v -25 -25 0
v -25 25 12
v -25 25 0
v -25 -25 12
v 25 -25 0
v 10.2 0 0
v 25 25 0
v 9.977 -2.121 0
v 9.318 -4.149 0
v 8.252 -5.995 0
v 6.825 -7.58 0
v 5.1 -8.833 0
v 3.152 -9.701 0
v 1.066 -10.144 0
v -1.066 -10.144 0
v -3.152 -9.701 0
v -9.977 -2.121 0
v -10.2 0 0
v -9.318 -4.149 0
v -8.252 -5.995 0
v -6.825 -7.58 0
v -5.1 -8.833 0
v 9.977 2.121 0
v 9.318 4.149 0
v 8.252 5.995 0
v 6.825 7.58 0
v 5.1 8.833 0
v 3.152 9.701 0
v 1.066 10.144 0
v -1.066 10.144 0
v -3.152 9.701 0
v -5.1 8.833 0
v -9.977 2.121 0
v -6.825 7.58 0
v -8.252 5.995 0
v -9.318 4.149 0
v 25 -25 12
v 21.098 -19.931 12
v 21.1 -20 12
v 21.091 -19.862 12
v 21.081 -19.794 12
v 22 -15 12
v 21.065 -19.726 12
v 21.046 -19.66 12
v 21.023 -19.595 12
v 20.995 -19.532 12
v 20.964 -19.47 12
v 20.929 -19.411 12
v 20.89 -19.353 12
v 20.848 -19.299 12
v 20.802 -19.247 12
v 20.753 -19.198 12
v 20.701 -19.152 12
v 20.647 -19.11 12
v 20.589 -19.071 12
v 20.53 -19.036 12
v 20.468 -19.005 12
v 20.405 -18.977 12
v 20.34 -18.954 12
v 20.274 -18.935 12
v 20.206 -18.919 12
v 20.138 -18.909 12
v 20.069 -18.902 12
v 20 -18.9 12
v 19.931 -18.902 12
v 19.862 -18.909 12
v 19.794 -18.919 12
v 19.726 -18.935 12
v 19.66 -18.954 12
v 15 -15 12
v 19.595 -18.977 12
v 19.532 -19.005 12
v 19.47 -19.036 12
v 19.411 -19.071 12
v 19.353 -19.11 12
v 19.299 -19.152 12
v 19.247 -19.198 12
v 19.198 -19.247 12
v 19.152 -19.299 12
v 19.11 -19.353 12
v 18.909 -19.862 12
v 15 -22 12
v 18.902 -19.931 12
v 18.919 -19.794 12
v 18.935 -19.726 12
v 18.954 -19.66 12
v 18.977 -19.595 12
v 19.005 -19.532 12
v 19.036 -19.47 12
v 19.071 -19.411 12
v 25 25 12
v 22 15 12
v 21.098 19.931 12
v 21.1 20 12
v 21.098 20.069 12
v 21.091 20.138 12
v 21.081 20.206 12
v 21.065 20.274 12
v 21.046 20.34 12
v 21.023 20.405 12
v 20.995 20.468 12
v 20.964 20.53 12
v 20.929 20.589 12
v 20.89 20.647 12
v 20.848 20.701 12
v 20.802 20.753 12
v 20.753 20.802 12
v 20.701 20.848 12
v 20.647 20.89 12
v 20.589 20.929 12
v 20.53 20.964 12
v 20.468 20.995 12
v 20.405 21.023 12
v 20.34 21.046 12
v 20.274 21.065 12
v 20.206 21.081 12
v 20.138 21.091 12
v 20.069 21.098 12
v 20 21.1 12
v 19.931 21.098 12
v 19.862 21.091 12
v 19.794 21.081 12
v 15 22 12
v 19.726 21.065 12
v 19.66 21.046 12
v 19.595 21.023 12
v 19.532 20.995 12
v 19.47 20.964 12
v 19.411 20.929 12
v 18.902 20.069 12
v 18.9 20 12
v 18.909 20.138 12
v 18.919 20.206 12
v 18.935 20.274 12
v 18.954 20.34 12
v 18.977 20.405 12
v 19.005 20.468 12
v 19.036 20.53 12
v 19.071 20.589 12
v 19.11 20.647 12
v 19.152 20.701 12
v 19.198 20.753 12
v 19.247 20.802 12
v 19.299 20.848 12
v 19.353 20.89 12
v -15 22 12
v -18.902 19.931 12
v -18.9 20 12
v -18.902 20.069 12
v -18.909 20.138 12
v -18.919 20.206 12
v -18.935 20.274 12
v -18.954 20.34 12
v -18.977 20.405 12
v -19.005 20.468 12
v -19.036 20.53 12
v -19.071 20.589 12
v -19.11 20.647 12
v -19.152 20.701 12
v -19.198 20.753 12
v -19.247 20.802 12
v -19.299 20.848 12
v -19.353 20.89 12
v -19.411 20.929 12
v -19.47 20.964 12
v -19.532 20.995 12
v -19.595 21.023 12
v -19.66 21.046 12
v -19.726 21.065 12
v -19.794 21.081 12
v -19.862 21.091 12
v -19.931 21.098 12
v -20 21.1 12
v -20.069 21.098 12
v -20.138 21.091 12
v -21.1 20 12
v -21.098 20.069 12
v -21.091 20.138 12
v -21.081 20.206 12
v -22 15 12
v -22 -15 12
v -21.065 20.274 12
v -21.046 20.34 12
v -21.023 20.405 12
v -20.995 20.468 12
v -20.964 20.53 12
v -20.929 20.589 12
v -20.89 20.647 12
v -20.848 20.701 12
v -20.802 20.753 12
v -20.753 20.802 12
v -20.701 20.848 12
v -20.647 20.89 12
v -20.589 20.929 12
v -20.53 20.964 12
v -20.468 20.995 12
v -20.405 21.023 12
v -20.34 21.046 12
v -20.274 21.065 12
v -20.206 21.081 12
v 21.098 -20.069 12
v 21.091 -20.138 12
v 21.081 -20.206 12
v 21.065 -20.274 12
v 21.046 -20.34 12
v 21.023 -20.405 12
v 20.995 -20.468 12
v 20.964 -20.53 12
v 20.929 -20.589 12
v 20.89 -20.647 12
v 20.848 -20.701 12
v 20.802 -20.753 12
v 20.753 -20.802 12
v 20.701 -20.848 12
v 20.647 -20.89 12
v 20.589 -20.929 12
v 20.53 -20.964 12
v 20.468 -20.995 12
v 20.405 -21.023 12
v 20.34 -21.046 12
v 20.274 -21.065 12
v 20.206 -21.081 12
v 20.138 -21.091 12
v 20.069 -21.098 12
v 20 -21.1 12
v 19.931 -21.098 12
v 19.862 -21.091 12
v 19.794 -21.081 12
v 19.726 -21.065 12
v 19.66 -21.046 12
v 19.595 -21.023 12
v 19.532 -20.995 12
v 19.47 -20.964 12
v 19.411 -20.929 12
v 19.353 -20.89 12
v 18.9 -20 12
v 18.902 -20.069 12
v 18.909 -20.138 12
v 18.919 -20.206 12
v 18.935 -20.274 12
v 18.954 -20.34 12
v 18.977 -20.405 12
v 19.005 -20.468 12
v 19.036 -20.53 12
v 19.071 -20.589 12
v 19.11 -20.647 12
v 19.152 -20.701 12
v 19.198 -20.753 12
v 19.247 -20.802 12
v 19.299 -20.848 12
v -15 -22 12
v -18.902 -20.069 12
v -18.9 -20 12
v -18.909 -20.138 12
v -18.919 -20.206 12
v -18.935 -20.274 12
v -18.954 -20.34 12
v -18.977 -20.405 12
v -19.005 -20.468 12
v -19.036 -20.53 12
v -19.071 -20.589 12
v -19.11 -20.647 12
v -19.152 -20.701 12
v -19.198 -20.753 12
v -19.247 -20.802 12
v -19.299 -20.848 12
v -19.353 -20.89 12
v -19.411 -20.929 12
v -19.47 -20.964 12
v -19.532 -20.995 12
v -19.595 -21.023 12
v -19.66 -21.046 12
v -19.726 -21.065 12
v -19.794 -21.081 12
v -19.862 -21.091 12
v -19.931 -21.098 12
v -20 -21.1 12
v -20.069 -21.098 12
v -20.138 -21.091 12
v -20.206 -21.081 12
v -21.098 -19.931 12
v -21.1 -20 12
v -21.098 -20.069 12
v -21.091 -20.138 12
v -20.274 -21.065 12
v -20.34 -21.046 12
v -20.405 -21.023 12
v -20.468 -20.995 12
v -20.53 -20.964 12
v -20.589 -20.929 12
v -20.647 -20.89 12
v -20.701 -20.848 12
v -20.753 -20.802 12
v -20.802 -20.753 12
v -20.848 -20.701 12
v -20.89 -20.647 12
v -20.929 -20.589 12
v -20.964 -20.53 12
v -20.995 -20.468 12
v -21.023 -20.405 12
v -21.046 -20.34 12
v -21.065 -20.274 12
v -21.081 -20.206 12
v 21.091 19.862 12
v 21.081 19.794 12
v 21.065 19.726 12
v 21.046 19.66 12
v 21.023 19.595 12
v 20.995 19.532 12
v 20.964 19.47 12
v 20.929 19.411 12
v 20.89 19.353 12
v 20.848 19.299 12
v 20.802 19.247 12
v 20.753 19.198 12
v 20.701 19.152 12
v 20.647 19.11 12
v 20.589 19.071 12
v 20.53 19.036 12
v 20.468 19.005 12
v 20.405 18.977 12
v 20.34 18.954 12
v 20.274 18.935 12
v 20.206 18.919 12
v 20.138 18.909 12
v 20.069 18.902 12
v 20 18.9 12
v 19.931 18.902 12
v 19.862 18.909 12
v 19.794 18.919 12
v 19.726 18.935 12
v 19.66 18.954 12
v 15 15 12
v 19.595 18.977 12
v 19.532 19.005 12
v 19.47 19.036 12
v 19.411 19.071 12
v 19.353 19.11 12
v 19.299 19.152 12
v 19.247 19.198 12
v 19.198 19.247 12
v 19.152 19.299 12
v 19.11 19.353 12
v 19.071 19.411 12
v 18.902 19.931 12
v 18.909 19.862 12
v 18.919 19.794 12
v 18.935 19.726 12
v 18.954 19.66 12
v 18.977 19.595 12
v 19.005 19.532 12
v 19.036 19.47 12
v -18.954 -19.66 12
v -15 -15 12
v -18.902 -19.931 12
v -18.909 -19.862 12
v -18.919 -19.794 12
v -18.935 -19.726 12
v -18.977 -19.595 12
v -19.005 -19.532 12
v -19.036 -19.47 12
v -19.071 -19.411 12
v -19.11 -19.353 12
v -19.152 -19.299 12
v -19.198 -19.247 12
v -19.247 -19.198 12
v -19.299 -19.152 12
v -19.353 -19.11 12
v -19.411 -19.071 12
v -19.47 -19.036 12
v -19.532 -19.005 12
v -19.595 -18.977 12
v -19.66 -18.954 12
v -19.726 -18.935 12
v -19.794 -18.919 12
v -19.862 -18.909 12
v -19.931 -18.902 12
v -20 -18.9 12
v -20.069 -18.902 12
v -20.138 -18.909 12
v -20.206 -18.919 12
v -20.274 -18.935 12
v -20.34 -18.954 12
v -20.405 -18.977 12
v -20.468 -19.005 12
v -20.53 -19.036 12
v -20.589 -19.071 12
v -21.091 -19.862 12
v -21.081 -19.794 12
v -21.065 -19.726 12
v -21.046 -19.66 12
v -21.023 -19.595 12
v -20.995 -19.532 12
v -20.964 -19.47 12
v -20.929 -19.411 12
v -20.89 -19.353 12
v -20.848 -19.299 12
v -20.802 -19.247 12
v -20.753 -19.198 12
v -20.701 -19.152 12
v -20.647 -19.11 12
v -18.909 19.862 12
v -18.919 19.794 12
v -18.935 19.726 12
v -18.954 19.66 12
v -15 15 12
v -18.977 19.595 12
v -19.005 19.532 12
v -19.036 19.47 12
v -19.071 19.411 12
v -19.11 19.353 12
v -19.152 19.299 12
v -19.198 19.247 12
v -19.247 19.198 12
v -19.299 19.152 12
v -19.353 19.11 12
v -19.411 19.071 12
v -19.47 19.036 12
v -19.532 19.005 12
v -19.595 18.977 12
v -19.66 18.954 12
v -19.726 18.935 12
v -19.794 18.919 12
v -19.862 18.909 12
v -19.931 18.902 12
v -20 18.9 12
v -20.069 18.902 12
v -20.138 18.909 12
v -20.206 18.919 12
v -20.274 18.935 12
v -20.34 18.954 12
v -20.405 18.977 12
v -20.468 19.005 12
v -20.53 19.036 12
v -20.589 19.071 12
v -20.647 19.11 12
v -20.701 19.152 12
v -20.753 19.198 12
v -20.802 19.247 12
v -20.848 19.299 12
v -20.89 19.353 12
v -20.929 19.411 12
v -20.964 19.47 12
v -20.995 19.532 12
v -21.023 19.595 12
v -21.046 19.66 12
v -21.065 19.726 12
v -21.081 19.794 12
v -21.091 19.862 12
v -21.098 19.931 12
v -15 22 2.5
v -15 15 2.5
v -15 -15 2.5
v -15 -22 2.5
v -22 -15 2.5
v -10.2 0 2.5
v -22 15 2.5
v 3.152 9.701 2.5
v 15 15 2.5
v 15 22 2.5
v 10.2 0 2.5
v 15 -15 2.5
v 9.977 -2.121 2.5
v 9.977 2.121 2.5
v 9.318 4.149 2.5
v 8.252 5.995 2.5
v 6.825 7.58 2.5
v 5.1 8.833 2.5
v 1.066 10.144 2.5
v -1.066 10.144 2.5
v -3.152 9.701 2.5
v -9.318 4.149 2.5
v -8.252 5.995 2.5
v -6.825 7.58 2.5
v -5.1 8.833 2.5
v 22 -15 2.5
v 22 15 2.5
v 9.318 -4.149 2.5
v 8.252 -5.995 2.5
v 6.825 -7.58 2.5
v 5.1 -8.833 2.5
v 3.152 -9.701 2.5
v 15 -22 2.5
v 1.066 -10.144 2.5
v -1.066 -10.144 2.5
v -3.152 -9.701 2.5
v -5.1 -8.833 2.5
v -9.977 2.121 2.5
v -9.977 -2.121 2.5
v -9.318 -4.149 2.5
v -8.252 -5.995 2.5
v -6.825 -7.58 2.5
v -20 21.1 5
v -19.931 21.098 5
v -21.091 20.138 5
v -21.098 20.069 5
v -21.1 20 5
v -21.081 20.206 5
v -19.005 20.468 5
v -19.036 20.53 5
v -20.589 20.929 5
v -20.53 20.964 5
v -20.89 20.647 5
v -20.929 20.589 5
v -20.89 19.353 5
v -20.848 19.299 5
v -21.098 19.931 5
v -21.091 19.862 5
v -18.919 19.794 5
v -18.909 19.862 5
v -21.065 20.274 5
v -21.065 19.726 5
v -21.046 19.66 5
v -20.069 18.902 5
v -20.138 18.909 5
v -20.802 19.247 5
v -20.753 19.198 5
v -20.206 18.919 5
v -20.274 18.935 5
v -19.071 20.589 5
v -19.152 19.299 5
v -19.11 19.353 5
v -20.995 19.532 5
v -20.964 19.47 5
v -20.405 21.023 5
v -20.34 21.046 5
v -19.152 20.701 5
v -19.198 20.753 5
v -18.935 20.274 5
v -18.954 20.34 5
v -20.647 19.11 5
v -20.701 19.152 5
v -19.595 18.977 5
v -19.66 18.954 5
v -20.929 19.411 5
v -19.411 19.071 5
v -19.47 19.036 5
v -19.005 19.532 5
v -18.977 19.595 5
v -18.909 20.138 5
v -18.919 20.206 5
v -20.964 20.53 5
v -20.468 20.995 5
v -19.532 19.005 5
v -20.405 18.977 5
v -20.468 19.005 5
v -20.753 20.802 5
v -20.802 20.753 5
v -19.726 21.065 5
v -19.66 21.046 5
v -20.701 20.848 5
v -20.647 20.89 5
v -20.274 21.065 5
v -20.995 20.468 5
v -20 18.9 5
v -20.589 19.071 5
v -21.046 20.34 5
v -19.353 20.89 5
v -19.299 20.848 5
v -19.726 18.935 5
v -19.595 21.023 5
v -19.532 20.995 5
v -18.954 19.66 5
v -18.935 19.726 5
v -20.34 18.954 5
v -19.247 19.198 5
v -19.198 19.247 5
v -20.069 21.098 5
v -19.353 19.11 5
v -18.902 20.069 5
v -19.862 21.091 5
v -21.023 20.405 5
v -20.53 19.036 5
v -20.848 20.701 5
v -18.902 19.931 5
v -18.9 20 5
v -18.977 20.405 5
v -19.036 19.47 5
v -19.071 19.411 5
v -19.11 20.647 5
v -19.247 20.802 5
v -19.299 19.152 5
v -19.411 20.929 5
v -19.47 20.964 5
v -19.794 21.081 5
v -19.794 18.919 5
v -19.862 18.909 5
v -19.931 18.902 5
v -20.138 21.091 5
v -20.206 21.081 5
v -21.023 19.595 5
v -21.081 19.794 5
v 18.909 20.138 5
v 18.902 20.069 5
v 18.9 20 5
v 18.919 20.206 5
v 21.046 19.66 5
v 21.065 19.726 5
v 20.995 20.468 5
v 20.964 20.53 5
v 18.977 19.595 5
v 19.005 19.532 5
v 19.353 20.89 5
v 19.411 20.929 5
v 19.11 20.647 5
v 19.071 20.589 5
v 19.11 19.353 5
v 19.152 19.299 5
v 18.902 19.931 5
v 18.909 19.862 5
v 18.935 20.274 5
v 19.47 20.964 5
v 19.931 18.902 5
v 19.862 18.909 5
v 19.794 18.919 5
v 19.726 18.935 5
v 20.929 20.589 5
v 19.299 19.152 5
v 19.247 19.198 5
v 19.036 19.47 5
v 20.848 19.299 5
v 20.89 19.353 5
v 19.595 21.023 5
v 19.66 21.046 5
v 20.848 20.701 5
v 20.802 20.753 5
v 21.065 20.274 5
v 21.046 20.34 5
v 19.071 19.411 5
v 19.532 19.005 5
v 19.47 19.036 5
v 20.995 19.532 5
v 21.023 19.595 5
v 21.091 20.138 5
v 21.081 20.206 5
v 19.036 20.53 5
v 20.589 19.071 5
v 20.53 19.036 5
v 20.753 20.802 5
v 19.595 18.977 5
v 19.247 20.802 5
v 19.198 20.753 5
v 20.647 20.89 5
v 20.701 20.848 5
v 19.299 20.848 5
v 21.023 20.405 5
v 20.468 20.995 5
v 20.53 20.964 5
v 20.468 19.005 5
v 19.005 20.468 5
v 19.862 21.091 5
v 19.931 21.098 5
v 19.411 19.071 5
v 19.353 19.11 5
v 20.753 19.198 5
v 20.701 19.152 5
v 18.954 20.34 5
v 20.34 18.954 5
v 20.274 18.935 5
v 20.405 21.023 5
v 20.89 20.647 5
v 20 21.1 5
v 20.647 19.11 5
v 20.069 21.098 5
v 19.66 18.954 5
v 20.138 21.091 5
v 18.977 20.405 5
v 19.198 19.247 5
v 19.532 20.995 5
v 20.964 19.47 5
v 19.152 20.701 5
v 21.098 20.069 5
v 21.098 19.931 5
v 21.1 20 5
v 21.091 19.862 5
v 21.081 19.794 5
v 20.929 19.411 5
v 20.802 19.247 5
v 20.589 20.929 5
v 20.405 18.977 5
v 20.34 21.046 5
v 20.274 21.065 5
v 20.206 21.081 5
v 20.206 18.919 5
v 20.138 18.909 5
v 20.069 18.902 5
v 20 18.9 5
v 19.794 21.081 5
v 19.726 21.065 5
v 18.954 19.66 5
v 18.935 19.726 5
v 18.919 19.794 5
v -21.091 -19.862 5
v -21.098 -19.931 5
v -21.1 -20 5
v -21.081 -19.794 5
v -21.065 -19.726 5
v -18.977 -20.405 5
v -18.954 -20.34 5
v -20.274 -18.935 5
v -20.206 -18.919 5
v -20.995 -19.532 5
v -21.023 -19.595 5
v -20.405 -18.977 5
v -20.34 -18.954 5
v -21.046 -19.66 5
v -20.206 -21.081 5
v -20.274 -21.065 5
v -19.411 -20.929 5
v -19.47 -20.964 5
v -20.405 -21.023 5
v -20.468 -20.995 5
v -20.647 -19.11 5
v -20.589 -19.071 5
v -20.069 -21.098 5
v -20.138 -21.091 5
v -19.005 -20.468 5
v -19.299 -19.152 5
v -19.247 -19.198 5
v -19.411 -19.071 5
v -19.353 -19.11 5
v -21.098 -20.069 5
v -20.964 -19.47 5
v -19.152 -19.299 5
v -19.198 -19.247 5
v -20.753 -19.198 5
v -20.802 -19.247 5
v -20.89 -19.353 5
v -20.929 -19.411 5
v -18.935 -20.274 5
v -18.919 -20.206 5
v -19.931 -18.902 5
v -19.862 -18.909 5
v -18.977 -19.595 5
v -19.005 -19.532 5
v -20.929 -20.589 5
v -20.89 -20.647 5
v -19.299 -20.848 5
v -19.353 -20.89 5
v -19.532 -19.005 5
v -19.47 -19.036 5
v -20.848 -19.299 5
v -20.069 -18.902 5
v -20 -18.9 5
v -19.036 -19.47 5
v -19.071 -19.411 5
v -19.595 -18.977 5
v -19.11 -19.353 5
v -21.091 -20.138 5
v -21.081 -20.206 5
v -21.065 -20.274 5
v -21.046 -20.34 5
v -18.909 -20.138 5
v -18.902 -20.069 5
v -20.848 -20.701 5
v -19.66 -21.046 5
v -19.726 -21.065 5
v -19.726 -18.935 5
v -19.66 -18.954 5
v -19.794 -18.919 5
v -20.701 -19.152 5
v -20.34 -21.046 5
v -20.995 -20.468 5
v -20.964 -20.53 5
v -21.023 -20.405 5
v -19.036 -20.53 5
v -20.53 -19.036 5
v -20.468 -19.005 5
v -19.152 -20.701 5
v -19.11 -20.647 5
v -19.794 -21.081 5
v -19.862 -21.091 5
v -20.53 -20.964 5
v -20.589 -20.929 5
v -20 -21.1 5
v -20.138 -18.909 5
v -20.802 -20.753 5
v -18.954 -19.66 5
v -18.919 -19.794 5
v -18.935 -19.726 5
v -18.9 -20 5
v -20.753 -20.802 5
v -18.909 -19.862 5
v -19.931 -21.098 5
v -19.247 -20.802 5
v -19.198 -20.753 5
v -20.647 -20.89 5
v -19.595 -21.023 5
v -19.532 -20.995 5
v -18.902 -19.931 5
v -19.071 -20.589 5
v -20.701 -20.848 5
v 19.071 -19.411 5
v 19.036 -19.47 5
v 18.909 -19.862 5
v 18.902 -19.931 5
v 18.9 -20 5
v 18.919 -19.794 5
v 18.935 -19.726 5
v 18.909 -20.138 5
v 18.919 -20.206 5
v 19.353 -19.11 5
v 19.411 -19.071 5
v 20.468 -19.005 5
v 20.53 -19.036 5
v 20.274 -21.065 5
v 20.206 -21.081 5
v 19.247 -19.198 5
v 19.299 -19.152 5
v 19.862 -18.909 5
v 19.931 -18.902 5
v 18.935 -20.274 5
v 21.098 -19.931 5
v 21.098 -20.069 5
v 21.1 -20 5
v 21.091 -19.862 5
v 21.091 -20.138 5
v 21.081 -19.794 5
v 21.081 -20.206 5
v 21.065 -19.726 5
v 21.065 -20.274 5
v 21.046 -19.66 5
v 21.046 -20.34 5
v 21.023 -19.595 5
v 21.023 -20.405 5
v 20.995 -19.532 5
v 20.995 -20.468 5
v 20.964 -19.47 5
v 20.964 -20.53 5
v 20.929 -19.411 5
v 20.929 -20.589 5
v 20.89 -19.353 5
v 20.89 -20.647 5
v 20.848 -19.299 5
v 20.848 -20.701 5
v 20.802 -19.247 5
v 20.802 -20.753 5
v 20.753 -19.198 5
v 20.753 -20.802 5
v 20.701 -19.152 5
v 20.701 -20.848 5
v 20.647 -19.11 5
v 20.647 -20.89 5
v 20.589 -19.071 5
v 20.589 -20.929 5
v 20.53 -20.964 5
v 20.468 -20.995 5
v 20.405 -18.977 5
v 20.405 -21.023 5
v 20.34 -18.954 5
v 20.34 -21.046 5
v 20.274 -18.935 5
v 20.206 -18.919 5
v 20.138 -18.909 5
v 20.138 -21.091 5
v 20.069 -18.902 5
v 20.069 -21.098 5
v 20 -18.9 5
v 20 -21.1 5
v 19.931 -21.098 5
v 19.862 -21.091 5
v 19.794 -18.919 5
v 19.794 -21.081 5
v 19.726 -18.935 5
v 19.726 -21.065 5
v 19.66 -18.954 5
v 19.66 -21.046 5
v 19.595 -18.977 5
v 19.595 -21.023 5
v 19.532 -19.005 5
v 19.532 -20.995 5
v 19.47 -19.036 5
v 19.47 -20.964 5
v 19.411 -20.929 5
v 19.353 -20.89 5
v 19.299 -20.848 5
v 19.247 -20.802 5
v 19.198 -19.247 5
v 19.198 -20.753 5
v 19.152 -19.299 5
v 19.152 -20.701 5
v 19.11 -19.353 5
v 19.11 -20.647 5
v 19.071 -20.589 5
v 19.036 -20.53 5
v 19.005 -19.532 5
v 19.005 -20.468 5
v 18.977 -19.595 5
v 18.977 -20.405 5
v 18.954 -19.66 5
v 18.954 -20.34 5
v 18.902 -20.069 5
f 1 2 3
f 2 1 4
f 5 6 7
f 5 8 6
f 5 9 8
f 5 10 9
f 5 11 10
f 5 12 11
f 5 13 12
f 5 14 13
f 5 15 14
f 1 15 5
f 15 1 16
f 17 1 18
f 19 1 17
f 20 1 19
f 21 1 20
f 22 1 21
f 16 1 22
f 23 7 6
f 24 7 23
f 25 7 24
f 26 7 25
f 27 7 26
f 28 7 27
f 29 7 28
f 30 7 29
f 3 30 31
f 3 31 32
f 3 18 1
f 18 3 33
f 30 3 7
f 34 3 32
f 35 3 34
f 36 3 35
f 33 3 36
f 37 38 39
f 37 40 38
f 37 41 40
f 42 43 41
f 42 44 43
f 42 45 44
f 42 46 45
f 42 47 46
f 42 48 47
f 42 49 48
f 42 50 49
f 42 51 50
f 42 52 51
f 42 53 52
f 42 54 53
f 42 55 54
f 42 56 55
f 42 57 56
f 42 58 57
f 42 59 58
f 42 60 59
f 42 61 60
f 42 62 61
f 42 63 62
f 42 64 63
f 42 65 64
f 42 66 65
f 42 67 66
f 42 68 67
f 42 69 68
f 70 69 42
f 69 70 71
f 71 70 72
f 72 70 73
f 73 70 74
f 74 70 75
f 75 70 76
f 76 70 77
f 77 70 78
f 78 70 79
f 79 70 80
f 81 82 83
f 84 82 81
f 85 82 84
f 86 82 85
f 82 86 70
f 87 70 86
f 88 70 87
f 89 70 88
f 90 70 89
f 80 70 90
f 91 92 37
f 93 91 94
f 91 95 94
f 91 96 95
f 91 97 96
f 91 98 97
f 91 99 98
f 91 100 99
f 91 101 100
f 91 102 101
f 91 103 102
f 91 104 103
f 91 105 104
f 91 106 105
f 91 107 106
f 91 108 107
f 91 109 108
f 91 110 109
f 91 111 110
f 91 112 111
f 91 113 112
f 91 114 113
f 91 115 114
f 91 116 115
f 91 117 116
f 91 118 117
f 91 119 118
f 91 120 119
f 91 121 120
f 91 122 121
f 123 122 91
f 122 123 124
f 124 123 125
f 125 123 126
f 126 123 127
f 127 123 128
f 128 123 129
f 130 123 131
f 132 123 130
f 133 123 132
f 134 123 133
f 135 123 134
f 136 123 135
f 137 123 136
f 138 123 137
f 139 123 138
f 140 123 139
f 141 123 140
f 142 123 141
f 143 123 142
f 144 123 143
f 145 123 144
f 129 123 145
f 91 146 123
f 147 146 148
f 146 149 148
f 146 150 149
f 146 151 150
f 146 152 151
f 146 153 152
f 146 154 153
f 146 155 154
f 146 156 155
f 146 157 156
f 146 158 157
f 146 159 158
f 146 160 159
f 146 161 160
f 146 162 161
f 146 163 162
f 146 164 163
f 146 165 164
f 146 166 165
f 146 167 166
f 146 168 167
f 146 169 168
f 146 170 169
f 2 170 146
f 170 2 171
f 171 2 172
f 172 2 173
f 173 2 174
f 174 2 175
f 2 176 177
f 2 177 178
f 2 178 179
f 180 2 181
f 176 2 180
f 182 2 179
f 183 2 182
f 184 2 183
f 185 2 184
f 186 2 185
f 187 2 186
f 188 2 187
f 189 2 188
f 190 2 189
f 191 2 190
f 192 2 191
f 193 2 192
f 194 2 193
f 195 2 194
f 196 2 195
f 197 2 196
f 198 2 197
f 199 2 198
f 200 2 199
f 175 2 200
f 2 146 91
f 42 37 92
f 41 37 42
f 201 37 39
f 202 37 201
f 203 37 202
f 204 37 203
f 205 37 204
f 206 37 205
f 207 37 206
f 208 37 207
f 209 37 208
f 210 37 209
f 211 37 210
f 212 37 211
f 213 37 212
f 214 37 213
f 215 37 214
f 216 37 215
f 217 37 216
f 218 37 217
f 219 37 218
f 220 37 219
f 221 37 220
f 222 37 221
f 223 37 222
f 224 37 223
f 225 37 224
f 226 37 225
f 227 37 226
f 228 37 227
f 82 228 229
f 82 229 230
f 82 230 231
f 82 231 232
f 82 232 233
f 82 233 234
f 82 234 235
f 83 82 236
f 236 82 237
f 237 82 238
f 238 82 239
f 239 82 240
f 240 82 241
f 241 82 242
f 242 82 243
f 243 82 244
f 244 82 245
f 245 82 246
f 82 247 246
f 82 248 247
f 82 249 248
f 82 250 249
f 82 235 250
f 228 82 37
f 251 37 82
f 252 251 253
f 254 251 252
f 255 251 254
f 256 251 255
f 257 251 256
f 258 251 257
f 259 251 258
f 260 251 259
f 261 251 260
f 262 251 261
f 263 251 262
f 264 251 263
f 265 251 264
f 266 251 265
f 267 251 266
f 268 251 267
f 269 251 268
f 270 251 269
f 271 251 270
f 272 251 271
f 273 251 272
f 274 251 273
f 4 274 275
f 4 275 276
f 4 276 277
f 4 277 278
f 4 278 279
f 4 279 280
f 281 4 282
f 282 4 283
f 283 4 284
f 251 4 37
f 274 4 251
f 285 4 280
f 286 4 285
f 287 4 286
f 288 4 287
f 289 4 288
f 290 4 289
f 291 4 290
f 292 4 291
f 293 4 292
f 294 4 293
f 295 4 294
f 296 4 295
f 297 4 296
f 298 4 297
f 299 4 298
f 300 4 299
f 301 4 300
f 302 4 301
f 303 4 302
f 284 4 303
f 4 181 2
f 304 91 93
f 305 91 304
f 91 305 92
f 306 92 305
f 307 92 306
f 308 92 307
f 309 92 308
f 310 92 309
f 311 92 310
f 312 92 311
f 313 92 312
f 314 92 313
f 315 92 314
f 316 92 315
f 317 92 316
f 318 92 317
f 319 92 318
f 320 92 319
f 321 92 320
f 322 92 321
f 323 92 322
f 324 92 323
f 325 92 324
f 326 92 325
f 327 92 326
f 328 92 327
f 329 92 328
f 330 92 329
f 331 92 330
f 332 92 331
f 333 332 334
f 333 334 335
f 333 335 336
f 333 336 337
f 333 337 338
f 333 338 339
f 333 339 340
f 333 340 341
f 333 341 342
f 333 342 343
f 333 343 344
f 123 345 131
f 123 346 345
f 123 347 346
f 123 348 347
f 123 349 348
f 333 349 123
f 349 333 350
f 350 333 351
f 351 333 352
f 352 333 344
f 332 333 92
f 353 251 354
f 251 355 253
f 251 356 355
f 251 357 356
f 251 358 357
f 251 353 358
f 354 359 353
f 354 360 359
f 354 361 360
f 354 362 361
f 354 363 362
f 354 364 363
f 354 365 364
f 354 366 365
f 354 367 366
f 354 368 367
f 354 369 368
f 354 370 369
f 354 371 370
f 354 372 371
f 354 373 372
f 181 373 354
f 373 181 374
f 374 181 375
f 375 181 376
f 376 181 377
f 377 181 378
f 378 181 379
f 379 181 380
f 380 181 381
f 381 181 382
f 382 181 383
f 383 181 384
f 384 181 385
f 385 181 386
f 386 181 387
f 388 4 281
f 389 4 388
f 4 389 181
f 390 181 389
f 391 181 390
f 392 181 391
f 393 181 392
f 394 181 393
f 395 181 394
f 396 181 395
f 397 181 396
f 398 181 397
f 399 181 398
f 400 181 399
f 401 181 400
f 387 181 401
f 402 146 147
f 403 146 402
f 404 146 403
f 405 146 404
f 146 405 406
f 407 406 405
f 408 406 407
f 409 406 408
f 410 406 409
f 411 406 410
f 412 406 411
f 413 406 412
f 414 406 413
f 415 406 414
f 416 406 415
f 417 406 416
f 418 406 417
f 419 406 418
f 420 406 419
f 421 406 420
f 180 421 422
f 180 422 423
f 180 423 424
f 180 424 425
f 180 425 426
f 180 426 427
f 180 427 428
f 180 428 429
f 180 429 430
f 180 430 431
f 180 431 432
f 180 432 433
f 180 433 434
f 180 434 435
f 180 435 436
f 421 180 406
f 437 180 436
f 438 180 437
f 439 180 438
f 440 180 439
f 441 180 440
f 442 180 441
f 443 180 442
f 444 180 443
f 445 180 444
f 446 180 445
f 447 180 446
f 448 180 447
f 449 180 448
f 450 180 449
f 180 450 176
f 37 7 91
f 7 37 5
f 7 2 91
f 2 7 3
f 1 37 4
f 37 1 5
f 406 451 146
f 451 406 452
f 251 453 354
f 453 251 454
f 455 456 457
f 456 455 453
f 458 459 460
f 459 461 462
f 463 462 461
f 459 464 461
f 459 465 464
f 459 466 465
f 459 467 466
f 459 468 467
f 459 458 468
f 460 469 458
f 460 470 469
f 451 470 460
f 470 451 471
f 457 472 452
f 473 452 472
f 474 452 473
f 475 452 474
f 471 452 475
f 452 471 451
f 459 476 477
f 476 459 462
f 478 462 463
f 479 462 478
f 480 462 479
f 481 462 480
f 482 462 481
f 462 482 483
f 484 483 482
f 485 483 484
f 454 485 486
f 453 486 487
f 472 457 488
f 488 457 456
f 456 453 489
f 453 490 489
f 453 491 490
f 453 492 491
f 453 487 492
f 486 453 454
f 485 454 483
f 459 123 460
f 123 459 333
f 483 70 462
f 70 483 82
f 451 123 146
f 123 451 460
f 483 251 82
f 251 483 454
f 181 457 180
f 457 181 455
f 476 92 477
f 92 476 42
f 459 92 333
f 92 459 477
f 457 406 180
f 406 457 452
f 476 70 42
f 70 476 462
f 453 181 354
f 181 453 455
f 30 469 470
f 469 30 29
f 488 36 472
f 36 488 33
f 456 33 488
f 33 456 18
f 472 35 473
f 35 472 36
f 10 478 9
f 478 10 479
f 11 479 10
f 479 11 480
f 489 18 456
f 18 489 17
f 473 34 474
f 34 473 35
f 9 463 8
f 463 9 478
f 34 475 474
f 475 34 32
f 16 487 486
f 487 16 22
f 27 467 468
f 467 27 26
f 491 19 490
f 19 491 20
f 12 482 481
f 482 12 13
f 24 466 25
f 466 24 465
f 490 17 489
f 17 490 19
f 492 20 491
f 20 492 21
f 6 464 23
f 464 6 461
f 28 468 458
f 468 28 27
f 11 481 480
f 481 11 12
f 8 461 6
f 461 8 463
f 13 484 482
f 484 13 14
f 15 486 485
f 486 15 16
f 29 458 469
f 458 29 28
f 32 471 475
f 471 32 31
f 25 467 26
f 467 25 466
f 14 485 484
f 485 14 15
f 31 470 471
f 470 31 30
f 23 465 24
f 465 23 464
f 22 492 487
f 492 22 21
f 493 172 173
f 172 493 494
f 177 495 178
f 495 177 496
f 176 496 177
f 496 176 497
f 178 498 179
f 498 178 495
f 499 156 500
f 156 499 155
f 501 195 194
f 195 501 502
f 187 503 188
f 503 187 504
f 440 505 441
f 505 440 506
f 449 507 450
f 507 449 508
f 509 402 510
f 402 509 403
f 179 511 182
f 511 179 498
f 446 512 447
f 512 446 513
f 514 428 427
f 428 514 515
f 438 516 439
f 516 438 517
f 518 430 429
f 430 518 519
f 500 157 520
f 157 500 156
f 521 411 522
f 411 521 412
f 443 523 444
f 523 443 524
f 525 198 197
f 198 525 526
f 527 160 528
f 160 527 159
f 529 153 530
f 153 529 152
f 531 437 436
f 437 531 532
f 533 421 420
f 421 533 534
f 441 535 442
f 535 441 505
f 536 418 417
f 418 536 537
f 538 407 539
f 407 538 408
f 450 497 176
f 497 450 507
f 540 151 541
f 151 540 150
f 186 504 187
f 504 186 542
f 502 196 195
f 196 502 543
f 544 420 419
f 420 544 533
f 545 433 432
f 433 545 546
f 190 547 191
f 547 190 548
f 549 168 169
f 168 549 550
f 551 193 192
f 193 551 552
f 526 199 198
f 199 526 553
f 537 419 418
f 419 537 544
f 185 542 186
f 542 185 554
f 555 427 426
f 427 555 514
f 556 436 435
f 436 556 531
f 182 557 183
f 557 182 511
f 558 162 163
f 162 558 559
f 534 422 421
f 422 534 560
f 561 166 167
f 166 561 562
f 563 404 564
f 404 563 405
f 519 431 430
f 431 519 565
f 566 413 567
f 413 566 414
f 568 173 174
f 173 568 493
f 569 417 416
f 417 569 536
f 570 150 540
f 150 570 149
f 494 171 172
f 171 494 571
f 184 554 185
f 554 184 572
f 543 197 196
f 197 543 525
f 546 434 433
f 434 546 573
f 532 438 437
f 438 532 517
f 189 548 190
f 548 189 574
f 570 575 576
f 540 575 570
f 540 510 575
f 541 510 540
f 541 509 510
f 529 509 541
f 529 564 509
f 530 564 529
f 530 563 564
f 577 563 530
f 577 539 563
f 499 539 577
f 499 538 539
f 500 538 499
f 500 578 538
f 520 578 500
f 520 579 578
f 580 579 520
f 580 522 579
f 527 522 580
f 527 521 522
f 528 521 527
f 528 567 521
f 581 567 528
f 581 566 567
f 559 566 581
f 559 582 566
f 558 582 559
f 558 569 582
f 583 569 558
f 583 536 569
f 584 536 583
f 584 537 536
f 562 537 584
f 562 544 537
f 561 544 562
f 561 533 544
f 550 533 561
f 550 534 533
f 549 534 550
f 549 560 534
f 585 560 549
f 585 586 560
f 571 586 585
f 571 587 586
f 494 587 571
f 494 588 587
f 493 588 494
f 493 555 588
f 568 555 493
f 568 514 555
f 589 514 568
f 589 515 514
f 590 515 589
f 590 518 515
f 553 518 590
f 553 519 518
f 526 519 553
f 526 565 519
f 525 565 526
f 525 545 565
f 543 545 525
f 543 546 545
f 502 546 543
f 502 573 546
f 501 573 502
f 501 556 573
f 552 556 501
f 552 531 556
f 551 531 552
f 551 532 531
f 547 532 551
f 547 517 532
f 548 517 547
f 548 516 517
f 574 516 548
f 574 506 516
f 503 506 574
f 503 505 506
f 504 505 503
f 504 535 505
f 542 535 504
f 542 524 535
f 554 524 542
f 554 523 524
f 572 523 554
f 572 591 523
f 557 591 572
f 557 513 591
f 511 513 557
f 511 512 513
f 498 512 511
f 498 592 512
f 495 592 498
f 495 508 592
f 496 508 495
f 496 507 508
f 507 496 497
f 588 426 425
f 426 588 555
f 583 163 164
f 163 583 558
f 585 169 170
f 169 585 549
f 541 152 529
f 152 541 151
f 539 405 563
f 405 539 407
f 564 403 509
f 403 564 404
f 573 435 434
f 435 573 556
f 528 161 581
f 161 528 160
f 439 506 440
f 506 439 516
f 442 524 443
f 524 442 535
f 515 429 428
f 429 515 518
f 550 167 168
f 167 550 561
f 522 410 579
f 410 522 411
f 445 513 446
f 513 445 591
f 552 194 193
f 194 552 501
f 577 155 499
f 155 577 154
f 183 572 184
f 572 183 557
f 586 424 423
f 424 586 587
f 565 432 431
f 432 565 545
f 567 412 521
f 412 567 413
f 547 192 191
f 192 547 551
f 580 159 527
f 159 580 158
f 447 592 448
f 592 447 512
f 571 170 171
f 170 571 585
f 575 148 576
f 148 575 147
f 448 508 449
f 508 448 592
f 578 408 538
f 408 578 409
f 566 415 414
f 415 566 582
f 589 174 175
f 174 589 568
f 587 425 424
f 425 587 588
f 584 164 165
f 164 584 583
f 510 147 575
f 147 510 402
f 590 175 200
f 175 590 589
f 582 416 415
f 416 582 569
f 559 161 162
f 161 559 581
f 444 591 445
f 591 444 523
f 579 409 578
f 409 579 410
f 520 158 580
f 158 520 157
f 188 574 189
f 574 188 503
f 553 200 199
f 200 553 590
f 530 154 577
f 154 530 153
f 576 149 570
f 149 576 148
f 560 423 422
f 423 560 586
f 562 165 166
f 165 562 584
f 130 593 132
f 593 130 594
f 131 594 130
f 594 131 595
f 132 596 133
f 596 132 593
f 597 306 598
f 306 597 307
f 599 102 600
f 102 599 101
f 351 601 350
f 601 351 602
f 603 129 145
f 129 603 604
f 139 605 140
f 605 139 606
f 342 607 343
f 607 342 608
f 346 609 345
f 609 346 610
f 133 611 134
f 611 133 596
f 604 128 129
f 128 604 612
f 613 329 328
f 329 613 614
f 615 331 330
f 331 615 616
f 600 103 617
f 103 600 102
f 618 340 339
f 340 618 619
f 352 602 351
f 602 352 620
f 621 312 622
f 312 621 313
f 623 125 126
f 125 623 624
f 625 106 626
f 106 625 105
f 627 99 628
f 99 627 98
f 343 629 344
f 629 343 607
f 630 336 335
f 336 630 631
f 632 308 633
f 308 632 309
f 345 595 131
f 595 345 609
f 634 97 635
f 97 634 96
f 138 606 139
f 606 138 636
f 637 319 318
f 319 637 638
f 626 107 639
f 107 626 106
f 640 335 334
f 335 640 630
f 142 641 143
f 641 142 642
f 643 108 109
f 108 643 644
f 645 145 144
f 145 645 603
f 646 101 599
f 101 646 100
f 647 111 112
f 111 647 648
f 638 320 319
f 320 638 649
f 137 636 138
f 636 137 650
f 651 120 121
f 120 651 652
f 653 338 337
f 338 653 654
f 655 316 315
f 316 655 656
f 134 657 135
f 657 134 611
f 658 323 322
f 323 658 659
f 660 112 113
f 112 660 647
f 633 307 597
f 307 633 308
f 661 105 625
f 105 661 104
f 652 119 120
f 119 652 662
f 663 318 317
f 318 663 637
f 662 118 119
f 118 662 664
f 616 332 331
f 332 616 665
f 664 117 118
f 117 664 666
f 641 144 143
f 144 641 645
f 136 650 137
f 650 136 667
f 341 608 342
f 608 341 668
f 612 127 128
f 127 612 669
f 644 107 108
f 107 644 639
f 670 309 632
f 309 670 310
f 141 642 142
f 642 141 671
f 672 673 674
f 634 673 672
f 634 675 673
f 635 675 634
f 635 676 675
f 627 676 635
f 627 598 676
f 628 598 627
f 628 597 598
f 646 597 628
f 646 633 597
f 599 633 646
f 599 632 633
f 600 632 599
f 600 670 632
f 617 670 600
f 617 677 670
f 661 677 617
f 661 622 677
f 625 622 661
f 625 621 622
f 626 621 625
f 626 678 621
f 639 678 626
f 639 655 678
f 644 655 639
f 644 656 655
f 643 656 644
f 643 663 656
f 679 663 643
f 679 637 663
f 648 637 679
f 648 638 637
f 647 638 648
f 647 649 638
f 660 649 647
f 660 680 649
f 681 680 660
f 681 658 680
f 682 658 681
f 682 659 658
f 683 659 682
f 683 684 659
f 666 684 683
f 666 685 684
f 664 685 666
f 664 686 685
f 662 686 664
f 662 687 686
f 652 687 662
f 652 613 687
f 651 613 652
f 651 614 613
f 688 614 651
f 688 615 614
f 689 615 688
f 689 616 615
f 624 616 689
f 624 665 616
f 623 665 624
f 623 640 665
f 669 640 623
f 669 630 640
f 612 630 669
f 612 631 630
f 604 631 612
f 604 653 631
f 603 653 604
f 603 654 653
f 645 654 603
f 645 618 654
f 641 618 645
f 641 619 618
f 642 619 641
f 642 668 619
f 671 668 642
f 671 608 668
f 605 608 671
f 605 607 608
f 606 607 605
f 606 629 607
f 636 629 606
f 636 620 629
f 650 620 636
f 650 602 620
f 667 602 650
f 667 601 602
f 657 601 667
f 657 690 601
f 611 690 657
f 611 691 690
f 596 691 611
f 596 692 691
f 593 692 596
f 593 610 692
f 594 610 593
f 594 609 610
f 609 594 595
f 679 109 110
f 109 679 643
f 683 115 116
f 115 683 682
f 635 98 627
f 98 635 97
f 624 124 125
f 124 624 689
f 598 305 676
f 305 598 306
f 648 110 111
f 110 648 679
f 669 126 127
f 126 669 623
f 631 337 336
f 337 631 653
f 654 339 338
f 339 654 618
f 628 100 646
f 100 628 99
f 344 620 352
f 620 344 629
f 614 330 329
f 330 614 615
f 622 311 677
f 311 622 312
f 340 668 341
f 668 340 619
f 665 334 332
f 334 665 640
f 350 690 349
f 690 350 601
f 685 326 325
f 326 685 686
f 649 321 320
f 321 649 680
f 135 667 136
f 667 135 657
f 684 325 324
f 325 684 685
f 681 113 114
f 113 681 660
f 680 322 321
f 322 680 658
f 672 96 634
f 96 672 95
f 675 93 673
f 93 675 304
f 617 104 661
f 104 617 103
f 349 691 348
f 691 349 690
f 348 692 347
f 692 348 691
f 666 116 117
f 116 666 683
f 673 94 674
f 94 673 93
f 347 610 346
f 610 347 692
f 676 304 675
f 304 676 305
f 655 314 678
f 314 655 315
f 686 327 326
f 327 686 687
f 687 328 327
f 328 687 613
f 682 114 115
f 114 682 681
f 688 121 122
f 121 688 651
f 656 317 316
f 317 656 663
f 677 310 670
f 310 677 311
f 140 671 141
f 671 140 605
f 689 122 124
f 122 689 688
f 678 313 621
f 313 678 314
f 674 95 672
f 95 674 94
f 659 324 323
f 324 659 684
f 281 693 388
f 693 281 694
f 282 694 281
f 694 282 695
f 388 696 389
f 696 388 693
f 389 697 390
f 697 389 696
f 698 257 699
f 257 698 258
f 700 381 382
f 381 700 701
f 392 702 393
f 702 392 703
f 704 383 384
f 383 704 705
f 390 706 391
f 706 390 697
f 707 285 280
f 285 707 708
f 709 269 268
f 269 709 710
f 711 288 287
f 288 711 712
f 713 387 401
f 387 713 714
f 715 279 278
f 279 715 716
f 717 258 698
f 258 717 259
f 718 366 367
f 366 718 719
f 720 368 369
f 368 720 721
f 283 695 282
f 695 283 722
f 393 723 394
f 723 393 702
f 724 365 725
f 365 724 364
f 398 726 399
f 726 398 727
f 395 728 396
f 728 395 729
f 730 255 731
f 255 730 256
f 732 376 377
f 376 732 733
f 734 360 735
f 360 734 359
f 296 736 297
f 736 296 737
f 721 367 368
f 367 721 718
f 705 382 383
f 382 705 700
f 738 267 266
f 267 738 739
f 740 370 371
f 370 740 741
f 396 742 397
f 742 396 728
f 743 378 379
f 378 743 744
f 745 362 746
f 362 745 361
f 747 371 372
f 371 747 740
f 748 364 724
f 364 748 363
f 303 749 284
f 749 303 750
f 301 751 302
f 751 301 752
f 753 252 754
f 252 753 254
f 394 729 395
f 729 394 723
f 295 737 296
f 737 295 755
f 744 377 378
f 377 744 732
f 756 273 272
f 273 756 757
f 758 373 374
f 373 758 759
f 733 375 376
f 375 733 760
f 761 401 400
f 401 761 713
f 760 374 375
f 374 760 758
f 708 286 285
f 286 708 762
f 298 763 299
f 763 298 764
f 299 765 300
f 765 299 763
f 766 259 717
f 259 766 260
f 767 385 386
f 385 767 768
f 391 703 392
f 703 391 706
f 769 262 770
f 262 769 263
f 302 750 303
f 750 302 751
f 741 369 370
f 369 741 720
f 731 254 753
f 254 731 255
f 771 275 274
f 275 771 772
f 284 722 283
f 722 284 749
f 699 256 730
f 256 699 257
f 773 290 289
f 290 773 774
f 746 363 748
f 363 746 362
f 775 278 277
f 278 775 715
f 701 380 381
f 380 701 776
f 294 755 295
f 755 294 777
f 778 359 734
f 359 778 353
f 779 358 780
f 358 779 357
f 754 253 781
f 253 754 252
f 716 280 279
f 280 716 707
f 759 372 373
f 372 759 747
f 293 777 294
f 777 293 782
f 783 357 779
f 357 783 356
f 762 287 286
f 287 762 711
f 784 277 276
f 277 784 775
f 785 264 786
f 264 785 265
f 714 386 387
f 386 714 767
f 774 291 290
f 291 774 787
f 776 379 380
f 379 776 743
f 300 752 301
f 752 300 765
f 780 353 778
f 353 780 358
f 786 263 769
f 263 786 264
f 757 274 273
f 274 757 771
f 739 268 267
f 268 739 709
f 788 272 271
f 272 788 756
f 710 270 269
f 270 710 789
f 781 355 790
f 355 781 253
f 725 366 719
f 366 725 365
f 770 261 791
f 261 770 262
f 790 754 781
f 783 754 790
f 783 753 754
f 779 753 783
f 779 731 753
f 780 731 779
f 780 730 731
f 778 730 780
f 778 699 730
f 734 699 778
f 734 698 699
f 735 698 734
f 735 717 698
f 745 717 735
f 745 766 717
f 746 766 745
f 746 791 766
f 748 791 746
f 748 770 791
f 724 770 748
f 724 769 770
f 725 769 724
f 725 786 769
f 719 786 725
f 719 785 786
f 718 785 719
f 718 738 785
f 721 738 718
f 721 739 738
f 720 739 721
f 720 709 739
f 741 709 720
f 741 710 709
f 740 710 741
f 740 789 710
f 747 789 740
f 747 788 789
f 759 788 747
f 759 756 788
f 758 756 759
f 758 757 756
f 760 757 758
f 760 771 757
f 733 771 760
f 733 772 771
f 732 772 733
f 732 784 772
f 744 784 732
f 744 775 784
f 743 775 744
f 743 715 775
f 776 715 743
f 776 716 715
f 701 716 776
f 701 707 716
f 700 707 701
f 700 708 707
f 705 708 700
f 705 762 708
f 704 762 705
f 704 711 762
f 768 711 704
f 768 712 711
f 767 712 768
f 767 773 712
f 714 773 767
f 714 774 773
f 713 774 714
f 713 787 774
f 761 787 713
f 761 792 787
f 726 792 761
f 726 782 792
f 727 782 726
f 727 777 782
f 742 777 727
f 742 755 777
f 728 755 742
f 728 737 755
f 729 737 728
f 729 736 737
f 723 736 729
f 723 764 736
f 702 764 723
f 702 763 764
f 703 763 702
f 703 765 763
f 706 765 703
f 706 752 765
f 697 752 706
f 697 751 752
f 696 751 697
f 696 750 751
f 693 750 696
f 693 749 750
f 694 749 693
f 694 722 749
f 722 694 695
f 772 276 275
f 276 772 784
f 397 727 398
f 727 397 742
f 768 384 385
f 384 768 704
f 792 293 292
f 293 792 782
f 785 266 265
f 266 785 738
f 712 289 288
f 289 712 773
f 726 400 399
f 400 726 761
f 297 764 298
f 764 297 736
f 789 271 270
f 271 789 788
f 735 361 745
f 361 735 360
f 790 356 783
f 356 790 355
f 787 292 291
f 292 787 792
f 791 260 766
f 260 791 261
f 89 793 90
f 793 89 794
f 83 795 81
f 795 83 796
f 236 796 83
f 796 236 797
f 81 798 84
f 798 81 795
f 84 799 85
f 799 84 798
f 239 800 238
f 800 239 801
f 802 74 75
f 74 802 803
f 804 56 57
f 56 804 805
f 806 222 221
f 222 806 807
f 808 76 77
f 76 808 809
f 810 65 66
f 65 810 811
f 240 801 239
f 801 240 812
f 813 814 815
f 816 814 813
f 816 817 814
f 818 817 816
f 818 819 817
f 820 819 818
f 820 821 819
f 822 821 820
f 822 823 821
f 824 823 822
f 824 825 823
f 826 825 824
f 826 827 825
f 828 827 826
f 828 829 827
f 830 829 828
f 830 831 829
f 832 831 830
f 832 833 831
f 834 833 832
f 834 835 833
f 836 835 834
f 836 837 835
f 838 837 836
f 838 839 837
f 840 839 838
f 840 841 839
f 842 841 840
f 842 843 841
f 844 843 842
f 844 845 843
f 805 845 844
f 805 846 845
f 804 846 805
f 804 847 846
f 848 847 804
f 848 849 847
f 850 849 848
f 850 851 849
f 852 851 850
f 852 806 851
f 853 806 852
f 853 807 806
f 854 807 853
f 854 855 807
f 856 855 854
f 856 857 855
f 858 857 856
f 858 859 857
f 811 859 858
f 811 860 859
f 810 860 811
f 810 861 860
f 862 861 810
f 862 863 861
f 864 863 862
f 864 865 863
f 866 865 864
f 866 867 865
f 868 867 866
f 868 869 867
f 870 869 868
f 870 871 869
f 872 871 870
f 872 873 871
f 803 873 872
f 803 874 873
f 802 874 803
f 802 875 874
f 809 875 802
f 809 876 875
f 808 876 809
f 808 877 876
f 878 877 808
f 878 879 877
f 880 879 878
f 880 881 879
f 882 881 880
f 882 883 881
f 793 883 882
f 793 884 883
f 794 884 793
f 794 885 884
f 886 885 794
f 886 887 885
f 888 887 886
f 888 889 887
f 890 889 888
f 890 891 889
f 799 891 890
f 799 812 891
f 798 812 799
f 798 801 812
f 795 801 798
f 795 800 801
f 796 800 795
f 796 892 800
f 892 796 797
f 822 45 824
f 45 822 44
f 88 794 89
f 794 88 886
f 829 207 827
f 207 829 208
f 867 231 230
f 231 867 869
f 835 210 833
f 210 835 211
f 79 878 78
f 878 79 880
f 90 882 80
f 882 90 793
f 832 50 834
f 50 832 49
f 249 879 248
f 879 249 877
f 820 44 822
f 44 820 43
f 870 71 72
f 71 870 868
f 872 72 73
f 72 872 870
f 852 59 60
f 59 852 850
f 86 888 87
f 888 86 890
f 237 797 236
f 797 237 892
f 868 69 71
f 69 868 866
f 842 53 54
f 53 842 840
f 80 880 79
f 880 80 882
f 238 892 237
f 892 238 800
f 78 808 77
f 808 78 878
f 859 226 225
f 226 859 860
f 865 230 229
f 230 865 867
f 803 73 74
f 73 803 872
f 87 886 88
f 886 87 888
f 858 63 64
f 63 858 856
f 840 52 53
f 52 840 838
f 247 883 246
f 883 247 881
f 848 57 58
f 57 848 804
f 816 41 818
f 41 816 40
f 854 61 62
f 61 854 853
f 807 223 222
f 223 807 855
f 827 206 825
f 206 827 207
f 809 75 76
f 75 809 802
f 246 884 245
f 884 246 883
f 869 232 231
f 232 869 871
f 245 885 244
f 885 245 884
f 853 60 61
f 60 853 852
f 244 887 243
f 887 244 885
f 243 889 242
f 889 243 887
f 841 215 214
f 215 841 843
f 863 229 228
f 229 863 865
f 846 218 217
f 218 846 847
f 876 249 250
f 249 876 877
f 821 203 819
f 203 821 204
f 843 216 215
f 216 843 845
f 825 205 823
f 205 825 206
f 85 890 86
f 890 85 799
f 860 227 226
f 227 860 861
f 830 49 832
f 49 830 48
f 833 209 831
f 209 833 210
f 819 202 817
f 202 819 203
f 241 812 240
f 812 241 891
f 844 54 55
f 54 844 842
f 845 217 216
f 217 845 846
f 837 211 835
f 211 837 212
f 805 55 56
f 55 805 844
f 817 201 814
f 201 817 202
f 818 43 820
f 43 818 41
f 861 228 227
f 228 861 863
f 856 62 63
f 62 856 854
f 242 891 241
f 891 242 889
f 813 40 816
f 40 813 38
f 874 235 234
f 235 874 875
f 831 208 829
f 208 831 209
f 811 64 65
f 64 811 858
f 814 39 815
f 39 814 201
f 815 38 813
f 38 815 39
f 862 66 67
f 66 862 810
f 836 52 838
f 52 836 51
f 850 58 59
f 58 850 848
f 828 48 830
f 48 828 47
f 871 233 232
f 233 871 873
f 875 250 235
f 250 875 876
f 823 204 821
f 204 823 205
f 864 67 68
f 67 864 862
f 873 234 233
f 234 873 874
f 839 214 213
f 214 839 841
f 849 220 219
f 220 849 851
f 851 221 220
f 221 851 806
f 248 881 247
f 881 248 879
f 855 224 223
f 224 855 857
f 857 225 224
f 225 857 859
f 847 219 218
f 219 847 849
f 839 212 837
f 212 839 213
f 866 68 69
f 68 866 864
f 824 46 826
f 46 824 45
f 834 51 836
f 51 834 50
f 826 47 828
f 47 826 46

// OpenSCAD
/* OpenSCAD module to create cylinder with chamfers 
	Gilles Gonon - http://gilles.gonon.free.fr/
	Creation date - 06/03/2015
	License : GNU GPL
*/

/* Bouton
color("blue") { 
	translate([0,0,0]) 
	difference() {
		union() {
			cylinder_chamfer(10,10);
			cylinder(r=12,h=2, $fn=100);
		}
		translate([0,-7,-1]) cylinder(r=2.3,h=2.5, $fn=50);
		translate([0,7,-1]) cylinder(r=2.3,h=2.5, $fn=50);
	}
} */
/* Box */
translate([0,0,12]) rotate([0,180,0]) 
	difference() {	
		translate([0,0,6]) cube([50, 50, 12], center=true);
		translate([0,0,4]) cube([30, 44, 11], center=true);
		translate([0,0,4]) cube([44, 30, 11], center=true);
		cylinder(r=10.2,h=30);
		translate([20,20,-1]) cylinder(r=1.1,h=8, $fn=100);
		translate([-20,20,-1]) cylinder(r=1.1,h=8, $fn=100);
		translate([20,-20,-1]) cylinder(r=1.1,h=8, $fn=100);
		translate([-20,-20,-1]) cylinder(r=1.1,h=8, $fn=100);
	}

module cylinder_chamfer(r,h,chamfer_size=2, chamfer_angle=45, bBoth=true) {
	r_cone = r + ((h-chamfer_size) / tan(chamfer_angle));
	h_cone = tan(chamfer_angle) * r_cone;
	
	intersection() {
		cylinder(r=r,h=h, $fn=100);
		cylinder(r1=r_cone, r2=0, h=h_cone, $fn=100);
		if (bBoth==true) {
			translate([0,0,h-h_cone]) 
				cylinder(r1=0, r2=r_cone, h=h_cone, $fn=100);
		}
	}
}
